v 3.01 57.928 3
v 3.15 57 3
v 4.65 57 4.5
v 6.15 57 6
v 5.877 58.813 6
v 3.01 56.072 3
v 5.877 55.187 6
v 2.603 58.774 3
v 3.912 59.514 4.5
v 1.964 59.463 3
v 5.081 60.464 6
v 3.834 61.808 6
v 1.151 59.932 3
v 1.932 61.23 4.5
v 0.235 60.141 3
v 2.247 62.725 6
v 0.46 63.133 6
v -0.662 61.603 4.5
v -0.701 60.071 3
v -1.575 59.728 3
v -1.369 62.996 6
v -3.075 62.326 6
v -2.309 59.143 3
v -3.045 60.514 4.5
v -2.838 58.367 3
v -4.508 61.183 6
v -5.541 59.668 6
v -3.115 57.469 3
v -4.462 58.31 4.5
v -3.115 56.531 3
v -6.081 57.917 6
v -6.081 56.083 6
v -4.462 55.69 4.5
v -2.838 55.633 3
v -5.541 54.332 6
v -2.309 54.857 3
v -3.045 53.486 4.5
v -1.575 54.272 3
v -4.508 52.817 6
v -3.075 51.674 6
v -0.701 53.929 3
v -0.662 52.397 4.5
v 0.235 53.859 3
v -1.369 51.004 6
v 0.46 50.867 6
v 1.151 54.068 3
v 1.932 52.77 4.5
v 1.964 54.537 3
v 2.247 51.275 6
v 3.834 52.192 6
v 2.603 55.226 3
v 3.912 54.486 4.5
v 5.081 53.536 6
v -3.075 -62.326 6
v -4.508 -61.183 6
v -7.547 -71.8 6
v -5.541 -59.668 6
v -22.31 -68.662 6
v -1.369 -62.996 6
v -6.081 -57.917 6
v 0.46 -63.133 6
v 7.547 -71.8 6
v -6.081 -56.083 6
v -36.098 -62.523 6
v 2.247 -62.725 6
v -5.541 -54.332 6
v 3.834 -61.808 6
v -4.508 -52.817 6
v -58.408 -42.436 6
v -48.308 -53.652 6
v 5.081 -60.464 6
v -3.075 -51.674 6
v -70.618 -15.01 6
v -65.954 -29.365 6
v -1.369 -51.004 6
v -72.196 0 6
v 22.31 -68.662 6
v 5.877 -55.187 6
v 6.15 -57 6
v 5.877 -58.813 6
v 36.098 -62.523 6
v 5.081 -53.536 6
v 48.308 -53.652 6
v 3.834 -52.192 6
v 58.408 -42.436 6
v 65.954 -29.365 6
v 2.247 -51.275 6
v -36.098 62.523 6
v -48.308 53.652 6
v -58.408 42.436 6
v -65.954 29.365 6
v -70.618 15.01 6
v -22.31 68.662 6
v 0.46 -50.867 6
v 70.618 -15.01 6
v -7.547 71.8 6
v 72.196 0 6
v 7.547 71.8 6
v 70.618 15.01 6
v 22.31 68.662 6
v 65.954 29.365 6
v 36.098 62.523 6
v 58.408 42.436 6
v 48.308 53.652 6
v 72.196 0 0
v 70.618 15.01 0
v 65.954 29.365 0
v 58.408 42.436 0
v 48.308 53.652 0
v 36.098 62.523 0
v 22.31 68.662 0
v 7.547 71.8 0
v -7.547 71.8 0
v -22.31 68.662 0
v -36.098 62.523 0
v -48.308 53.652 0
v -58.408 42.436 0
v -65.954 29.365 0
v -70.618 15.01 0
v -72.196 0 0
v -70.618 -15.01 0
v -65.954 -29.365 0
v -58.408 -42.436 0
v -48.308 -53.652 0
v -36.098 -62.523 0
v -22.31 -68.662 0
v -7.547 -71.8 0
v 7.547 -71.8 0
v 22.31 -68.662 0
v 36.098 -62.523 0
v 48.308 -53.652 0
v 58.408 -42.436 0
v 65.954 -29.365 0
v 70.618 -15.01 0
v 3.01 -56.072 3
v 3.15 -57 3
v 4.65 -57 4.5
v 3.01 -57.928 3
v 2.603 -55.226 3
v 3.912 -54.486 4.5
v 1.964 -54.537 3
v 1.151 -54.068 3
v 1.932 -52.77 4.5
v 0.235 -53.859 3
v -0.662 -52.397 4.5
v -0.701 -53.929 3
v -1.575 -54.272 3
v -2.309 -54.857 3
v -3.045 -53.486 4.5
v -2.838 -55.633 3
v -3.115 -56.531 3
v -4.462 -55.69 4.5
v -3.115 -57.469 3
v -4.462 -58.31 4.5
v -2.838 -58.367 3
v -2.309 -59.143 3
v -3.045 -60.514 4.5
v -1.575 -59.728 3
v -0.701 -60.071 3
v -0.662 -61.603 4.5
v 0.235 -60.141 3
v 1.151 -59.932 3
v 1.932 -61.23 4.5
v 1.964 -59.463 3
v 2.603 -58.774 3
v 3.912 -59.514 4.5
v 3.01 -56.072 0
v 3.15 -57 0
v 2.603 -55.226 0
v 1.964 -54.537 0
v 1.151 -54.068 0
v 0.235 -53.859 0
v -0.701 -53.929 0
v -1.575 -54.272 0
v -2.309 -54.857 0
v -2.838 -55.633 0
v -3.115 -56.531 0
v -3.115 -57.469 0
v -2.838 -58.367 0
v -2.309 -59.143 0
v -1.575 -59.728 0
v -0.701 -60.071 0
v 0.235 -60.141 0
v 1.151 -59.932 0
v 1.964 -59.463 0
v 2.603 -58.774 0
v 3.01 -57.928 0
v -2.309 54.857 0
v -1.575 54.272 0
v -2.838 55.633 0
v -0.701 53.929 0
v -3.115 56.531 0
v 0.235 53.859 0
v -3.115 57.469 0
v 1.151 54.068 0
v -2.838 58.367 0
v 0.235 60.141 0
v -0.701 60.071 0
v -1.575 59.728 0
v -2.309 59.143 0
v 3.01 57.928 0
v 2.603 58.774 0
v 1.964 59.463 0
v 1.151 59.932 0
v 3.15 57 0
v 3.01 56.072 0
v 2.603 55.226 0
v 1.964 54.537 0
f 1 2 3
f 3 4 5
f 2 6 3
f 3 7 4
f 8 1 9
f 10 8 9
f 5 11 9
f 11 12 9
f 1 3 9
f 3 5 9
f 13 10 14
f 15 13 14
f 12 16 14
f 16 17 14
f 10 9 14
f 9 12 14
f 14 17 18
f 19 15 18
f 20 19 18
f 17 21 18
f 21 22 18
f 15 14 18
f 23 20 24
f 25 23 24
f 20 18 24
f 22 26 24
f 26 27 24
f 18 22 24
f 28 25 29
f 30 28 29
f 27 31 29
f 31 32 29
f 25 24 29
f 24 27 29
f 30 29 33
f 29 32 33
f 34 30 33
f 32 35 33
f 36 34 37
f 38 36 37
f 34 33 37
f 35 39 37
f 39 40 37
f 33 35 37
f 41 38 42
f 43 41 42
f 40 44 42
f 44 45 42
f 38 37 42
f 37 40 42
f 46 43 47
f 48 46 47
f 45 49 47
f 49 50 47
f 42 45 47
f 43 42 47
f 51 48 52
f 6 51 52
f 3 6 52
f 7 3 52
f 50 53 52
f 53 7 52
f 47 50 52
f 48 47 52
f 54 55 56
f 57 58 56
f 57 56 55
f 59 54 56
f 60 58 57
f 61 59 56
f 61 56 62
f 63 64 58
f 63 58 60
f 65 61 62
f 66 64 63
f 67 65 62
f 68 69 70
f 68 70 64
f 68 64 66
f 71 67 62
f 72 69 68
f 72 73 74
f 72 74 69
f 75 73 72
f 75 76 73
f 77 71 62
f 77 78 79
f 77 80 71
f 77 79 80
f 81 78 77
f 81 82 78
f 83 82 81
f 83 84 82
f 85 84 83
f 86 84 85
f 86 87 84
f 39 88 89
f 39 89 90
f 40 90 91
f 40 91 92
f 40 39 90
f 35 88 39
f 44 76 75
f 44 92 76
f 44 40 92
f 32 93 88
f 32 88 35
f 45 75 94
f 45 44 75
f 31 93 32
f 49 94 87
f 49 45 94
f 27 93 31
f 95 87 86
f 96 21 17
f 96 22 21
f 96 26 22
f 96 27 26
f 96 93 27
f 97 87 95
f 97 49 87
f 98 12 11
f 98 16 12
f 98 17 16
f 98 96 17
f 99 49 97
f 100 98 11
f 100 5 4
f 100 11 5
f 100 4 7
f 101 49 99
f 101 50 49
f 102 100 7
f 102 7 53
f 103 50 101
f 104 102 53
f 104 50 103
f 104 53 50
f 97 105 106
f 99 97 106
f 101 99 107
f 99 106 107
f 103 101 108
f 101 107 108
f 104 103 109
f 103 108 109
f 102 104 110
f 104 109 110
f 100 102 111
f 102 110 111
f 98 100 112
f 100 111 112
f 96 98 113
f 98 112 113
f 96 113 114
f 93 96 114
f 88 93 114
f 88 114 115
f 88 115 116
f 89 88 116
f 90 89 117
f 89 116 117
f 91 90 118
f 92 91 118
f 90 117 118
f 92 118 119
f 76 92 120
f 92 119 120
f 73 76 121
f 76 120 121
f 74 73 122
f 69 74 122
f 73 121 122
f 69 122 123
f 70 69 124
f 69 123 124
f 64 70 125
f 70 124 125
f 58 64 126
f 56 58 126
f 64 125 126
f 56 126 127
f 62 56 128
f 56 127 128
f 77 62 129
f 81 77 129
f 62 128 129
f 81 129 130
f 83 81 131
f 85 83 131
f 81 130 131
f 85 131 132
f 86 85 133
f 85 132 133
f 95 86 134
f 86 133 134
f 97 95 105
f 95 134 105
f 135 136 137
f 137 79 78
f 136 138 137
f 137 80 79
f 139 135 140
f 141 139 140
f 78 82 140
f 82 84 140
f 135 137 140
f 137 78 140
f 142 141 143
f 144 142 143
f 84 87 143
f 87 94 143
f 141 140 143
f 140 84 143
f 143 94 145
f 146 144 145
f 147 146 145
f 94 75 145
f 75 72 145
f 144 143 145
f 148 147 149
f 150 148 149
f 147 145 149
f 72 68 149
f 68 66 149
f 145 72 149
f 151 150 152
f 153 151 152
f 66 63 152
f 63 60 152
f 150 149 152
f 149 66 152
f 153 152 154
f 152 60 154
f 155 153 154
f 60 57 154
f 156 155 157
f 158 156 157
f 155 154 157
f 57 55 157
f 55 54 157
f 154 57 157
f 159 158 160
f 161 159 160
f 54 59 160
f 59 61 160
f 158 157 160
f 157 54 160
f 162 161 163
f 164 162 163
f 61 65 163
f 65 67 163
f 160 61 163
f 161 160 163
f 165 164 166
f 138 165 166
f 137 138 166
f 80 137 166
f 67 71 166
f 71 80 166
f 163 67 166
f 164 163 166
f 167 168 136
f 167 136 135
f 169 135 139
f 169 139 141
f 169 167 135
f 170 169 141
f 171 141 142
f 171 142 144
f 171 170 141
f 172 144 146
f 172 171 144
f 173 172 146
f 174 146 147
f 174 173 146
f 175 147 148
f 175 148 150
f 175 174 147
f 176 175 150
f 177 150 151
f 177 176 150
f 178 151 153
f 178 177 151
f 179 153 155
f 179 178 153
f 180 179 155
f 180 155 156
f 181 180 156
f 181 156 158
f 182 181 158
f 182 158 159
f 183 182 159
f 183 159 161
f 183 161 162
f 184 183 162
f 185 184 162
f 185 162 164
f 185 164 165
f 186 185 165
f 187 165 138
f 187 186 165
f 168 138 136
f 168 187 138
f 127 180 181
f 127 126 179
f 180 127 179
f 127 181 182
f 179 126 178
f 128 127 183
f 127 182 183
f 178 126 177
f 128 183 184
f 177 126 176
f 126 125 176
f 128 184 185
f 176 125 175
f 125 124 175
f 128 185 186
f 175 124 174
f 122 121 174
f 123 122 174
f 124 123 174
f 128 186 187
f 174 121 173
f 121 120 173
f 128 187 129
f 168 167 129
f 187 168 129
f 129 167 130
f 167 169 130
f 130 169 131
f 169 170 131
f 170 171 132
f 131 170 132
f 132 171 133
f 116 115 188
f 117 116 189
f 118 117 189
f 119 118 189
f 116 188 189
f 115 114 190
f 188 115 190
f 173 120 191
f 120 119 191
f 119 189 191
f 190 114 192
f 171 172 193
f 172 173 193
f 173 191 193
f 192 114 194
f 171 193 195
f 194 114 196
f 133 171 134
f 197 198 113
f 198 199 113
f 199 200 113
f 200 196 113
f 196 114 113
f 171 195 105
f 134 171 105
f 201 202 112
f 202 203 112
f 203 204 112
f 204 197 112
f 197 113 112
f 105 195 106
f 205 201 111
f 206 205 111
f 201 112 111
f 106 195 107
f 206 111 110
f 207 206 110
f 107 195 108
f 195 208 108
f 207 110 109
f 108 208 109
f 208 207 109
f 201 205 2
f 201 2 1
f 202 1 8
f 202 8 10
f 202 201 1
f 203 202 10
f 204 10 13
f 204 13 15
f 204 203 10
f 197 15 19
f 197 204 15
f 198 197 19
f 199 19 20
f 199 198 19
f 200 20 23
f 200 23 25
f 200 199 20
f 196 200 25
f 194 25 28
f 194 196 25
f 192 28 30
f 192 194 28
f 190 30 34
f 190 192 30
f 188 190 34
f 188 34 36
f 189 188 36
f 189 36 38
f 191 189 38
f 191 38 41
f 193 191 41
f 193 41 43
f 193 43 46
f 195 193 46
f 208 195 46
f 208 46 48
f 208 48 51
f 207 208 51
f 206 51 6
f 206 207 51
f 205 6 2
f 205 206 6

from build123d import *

# Parameters (mm, degrees)
F0_R     = 24.06525
F0_R_2   = 1.05
F1_DEPTH = 2
F2_SIZE  = 1
F3_SCALE = 3


with BuildPart() as f1:
    # F0 (on Top) → F1 (new body)
    with BuildSketch(Plane.XY):
        Circle(F0_R)
        with Locations((0, -19)):
            Circle(F0_R_2, mode=Mode.SUBTRACT)
        with Locations((0, 19)):
            Circle(F0_R_2, mode=Mode.SUBTRACT)
    extrude(amount=F1_DEPTH)

    # F2
    f2_edges = [f1.edges().sort_by_distance(p)[0] for p in [
        (-1.05, 19, 2),
        (-1.05, -19, 2),
    ]]
    chamfer(f2_edges, length=F2_SIZE)


with BuildPart() as f1_1:
    # F3: moved
    add(f1.part.scale(F3_SCALE))


solid = f1_1.part
